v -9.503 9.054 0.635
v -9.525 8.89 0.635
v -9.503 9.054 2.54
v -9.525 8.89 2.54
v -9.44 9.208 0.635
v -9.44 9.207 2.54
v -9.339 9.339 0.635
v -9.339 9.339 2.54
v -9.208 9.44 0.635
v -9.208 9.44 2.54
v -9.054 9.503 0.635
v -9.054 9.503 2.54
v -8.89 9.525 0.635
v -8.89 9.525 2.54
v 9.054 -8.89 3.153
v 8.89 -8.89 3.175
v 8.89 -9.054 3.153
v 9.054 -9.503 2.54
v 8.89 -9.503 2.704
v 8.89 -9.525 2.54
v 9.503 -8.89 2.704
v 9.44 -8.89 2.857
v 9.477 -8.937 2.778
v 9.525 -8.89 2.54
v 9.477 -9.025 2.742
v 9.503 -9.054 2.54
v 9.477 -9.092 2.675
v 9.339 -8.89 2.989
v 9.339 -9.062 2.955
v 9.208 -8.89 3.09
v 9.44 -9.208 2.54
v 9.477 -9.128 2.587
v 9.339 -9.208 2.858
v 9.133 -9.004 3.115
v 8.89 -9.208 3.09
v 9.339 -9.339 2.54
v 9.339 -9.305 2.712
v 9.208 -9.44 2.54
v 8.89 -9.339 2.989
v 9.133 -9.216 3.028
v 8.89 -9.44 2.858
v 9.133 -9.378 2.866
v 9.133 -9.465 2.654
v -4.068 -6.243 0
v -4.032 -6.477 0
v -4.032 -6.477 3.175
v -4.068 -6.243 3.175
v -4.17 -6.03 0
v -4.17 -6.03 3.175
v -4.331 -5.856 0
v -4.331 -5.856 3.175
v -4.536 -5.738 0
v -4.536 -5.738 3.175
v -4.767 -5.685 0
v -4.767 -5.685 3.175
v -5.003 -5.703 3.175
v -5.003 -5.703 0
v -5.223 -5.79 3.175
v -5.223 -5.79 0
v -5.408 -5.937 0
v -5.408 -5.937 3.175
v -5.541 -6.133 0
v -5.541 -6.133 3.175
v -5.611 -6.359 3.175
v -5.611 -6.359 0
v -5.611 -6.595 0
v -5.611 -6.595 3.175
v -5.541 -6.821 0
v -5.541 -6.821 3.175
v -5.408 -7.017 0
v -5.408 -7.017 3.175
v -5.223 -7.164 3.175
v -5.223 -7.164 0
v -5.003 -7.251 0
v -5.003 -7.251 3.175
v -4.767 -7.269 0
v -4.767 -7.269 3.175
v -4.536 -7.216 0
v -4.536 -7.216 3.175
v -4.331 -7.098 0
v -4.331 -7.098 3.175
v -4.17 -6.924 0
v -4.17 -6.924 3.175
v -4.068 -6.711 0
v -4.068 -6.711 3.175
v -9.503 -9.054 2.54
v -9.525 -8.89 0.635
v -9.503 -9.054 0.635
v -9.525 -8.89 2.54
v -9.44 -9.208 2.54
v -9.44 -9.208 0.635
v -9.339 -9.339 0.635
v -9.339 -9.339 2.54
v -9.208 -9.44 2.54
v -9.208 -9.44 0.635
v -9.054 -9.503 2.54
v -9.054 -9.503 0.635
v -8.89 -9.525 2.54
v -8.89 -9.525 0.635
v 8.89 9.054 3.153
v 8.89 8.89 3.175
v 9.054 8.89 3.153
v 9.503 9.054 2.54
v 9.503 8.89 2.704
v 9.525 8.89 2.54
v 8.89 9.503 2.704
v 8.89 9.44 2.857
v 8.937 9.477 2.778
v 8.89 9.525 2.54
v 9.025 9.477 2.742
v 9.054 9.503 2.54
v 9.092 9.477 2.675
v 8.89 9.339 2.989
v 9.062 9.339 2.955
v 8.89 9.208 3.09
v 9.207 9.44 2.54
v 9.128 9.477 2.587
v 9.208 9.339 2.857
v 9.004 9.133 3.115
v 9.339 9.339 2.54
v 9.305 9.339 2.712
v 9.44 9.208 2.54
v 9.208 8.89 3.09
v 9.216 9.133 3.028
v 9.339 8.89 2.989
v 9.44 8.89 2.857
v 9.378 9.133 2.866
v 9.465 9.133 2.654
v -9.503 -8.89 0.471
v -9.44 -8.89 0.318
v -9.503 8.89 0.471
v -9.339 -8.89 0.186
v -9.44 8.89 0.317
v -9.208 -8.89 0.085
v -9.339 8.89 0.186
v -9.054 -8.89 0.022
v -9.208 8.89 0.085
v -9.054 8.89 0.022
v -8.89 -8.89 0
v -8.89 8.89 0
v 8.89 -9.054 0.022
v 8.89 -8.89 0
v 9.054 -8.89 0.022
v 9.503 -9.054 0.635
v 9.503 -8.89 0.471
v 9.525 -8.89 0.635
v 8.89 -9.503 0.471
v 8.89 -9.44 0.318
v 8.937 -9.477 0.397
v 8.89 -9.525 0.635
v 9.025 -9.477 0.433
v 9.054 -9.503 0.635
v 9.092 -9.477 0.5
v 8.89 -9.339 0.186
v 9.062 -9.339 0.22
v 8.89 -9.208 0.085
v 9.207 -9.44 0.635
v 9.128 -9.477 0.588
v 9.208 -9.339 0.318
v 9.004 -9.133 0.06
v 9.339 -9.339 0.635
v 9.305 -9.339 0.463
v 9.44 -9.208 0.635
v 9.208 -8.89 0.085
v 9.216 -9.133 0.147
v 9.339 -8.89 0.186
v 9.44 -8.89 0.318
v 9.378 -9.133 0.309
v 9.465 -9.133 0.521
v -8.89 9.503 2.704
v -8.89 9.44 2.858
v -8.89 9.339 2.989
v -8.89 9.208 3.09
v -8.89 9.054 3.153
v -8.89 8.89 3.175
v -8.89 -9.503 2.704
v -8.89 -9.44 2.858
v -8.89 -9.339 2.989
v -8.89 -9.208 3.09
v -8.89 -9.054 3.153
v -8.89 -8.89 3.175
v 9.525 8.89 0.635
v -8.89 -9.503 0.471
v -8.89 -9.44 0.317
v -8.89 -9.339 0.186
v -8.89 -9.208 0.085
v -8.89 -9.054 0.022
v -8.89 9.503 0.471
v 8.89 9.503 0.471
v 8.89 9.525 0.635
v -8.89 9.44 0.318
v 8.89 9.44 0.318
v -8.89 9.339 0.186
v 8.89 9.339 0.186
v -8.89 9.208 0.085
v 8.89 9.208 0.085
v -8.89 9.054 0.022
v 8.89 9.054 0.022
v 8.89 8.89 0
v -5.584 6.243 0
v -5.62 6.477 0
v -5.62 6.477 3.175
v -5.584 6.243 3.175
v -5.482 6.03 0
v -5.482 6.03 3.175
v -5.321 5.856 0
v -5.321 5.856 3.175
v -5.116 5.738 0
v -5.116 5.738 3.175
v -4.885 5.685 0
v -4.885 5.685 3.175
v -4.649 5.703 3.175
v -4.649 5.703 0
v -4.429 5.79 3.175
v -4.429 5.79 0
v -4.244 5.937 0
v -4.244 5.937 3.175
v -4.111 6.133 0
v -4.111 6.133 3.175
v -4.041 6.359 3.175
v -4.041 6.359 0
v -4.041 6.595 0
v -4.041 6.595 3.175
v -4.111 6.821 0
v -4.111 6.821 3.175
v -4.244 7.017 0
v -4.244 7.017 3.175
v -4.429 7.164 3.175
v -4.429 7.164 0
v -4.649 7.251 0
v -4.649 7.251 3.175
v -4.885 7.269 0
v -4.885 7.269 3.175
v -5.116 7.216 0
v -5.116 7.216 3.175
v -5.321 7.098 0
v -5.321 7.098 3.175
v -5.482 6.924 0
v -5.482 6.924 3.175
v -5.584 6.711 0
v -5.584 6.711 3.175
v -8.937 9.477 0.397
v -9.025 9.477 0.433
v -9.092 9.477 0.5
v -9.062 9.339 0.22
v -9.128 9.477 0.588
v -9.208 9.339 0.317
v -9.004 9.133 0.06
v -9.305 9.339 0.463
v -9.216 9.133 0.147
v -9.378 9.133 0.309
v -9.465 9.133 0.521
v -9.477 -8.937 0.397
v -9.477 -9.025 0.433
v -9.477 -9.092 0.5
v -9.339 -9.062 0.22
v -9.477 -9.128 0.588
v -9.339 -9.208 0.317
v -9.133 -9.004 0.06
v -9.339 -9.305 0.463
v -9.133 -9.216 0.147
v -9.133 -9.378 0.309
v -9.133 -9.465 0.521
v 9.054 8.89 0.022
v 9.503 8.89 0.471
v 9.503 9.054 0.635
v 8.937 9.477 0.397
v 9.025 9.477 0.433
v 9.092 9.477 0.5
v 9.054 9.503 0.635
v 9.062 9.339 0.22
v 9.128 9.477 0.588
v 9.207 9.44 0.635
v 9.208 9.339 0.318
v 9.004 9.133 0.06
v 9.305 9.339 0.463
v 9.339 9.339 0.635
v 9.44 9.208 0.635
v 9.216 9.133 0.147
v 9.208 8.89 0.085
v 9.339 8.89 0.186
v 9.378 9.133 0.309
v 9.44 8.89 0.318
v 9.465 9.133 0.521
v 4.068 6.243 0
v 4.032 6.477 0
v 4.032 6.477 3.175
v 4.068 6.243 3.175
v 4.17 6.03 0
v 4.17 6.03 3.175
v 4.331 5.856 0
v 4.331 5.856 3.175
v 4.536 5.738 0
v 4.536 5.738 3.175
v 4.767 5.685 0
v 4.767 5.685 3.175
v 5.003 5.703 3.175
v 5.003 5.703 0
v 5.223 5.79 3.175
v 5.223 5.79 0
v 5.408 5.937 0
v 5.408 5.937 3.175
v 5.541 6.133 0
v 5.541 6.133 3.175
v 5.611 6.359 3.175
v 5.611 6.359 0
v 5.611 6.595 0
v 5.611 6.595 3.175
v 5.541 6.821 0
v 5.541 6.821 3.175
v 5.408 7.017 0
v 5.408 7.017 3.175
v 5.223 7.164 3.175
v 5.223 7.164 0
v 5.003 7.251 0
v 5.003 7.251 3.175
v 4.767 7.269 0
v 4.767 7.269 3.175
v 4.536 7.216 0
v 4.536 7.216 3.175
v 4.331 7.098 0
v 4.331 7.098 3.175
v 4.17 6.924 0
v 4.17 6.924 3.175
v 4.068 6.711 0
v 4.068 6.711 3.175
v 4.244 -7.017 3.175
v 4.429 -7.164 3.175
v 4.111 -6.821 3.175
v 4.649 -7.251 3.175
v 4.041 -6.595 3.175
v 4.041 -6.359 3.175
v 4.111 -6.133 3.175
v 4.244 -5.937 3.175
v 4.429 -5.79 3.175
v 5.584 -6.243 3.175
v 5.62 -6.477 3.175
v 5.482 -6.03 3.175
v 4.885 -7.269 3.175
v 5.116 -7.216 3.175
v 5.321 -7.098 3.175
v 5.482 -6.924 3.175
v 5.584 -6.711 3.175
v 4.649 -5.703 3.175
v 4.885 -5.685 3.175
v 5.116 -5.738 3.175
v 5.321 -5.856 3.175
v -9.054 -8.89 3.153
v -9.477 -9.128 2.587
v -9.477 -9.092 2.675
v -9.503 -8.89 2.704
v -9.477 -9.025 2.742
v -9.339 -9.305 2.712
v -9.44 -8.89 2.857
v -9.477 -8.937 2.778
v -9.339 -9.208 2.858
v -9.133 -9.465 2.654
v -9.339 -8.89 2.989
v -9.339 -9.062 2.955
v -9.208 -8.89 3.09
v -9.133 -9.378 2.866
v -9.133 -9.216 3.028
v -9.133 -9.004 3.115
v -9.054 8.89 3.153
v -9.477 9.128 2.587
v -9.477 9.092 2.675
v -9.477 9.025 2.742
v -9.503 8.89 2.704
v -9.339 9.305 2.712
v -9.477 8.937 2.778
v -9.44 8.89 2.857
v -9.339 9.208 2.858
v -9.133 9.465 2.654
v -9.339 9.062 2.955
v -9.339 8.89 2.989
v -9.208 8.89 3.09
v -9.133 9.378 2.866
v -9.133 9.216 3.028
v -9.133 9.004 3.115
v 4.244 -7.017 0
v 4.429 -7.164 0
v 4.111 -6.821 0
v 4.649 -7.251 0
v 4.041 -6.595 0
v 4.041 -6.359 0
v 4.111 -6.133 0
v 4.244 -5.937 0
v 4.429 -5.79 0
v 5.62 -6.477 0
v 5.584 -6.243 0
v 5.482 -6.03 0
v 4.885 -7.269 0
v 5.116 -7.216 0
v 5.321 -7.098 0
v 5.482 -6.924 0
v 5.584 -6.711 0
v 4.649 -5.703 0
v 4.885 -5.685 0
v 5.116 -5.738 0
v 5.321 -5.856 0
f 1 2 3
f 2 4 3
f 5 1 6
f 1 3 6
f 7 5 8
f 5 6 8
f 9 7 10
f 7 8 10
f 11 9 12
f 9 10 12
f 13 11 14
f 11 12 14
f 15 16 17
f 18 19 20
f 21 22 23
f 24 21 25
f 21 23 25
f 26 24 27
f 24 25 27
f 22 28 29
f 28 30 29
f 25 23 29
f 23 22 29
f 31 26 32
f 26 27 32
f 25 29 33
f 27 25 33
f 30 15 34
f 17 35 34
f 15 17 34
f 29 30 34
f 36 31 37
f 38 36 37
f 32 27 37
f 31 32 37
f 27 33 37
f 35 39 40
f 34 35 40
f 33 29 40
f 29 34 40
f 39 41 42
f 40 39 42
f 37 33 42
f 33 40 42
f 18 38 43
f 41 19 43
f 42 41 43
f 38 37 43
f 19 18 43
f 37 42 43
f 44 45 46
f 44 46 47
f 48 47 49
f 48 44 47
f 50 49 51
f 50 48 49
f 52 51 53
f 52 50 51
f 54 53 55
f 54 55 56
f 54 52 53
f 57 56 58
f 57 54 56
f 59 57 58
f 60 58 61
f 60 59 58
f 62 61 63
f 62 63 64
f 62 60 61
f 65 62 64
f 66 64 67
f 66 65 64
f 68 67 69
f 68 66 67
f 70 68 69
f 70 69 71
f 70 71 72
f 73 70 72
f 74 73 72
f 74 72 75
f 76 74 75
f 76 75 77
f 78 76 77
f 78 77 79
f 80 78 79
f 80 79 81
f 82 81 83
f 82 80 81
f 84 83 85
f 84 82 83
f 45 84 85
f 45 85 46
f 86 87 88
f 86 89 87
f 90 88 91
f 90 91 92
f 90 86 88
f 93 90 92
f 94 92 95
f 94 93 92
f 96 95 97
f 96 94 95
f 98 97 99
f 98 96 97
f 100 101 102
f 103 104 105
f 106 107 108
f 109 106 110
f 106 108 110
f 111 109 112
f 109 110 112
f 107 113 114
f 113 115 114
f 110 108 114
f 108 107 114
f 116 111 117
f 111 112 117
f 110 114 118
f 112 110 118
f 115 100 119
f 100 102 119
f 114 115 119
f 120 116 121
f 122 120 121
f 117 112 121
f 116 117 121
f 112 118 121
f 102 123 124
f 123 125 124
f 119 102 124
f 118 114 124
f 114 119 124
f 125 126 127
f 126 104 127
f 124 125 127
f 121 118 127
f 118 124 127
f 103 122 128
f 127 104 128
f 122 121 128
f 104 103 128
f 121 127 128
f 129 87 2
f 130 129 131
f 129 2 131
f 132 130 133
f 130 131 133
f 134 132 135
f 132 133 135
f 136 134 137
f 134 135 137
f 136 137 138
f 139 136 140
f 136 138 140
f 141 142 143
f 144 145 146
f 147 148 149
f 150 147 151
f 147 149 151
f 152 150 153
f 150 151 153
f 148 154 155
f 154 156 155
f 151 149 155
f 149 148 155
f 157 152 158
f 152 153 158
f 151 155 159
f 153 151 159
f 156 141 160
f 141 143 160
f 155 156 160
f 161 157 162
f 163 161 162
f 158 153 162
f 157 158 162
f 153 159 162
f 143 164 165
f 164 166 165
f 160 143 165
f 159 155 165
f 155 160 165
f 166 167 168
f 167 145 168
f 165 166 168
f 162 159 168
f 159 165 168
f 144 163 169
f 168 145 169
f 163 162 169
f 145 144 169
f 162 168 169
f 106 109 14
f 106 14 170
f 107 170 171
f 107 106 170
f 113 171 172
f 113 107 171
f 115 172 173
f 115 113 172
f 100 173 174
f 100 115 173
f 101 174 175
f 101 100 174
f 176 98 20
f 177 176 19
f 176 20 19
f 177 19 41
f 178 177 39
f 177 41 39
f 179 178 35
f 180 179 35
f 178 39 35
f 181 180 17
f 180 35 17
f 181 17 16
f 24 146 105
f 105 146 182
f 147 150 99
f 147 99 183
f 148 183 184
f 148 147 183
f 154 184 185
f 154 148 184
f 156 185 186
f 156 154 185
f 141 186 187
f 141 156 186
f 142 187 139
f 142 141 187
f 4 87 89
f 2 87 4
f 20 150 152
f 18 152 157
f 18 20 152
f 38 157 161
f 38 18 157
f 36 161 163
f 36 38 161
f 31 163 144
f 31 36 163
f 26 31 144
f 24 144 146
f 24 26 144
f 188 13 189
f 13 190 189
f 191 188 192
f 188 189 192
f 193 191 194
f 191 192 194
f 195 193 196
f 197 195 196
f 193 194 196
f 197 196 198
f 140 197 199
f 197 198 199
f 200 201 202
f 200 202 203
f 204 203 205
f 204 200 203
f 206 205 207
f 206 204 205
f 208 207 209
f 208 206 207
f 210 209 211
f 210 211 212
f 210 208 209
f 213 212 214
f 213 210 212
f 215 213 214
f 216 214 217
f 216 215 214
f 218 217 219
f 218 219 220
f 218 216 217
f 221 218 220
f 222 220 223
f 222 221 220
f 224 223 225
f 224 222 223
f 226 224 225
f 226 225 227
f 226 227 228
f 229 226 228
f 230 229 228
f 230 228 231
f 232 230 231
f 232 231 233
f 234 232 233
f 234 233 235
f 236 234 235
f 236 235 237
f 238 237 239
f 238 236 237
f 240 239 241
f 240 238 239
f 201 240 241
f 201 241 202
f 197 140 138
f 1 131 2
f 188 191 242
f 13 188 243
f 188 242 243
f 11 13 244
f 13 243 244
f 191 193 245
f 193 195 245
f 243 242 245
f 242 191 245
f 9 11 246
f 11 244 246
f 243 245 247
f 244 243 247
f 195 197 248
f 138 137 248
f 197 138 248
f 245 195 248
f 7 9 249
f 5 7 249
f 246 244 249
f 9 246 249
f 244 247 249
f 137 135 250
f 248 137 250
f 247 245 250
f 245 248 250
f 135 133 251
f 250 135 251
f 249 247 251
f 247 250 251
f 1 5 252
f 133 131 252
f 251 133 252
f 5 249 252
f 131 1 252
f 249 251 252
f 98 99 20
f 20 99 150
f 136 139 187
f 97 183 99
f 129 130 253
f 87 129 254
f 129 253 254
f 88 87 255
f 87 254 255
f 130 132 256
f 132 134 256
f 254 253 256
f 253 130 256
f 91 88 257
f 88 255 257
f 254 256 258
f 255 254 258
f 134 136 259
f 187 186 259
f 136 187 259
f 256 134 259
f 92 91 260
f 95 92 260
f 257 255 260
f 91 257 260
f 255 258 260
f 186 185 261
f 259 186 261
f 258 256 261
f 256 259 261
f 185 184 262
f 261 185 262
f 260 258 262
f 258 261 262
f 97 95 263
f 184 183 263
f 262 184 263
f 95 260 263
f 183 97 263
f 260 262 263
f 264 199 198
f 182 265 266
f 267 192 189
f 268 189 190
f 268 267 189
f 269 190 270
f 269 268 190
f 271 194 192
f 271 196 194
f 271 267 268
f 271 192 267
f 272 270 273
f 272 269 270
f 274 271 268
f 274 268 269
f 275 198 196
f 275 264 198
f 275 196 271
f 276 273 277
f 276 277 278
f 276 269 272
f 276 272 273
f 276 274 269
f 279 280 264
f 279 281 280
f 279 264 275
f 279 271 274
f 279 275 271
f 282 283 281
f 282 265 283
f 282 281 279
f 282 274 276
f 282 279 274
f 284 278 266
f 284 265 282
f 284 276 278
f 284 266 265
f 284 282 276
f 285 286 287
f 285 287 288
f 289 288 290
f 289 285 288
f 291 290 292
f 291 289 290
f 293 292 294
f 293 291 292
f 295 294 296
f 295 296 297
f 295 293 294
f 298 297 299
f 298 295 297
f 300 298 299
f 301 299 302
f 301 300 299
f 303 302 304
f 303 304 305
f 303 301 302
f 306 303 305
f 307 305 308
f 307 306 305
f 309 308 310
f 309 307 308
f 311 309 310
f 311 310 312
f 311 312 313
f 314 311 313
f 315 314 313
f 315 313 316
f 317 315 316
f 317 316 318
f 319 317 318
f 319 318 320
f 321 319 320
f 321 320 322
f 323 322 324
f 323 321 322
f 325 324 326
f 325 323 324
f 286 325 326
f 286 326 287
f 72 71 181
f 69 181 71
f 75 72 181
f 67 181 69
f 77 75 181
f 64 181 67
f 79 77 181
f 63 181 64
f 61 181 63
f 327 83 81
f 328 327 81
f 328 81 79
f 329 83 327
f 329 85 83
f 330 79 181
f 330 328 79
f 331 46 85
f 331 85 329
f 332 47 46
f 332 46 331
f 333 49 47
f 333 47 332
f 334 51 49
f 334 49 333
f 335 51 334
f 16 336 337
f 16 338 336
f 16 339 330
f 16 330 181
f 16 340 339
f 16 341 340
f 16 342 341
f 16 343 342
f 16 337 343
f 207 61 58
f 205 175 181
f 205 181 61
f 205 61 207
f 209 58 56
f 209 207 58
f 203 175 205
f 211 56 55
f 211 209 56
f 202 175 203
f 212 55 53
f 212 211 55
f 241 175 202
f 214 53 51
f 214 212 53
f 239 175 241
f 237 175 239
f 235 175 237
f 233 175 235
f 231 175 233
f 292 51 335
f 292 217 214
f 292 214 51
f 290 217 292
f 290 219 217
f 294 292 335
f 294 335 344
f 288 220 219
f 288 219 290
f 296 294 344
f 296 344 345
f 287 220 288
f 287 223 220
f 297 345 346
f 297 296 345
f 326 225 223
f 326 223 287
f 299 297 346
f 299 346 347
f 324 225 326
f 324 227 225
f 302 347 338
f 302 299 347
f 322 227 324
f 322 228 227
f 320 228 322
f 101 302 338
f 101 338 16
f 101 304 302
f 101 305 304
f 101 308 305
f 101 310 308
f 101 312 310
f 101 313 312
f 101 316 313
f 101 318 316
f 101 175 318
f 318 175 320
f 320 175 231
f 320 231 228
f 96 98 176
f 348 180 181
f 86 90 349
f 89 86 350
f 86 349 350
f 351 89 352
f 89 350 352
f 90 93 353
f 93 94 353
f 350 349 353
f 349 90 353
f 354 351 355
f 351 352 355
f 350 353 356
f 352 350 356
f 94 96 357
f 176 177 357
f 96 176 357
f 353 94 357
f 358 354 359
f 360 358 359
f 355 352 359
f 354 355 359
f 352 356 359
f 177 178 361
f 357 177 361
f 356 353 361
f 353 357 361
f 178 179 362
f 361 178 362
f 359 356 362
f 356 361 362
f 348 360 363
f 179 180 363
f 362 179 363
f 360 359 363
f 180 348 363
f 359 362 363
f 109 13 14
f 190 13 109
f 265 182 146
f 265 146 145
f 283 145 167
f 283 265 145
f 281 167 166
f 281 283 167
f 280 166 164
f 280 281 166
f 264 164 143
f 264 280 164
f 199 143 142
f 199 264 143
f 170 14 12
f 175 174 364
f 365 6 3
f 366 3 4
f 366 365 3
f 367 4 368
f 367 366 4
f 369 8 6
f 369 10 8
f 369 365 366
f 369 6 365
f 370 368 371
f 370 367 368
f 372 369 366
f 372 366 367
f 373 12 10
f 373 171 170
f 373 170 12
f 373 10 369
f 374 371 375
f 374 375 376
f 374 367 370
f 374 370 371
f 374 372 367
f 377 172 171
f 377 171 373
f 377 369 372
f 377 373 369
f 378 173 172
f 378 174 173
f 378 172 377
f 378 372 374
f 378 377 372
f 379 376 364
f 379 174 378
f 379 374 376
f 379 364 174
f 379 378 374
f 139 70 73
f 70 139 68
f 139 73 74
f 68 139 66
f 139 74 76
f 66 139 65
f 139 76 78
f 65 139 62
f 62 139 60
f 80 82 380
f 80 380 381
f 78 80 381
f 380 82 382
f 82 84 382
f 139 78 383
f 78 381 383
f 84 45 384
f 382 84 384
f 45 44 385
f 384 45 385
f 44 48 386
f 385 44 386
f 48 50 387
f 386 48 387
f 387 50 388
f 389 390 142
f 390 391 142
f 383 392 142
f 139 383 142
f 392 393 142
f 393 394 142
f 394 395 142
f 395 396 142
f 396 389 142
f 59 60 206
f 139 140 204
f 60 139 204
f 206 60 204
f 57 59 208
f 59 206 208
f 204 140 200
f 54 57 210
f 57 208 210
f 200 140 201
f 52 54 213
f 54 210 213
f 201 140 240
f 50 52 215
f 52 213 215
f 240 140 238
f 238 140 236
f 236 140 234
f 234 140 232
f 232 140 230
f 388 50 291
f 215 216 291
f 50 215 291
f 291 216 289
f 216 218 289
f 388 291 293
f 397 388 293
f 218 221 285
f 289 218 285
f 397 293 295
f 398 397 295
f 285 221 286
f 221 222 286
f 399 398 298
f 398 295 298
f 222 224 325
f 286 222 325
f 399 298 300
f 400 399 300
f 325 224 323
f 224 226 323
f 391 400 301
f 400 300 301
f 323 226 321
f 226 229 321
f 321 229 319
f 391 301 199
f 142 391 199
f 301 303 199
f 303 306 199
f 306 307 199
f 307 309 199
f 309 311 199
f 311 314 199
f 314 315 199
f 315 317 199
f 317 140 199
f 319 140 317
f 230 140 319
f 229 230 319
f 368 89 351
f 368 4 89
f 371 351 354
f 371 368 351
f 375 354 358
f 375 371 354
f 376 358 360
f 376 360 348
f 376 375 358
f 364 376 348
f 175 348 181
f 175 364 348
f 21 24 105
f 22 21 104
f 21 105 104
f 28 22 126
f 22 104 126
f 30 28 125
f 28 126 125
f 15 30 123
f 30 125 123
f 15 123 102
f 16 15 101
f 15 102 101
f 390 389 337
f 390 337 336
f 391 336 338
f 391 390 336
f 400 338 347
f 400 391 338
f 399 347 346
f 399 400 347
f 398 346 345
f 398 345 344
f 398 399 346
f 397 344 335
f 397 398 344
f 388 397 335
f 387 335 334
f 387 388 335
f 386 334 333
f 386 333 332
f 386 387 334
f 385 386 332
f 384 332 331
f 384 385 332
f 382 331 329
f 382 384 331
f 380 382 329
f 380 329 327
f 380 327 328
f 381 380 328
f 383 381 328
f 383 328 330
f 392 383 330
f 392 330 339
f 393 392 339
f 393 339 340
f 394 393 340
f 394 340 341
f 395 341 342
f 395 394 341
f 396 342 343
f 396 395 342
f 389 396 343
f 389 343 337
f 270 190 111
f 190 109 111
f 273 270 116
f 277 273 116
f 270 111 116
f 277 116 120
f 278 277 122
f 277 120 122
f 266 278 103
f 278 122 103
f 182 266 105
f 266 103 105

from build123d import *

# Parameters (mm, degrees)
SKETCH1_W           = 19.05
SKETCH1_H           = 19.05
SKETCH1_R           = 0.79375
BOSS_EXTRUDE1_DEPTH = 3.175
FILLET2_R           = 0.635


with BuildPart() as part:
    # Sketch1 → Boss-Extrude1 (new body)
    with BuildSketch(Plane.XY):
        Rectangle(SKETCH1_W, SKETCH1_H)
        with Locations((-4.826, -6.477)):
            Circle(SKETCH1_R, mode=Mode.SUBTRACT)
        with Locations((4.826, -6.477)):
            Circle(SKETCH1_R, mode=Mode.SUBTRACT)
        with Locations(Location((4.826, 6.477, 0), (0, 0, 180))):
            Circle(SKETCH1_R, mode=Mode.SUBTRACT)
        with Locations(Location((-4.826, 6.477, 0), (0, 0, 180))):
            Circle(SKETCH1_R, mode=Mode.SUBTRACT)
    extrude(amount=BOSS_EXTRUDE1_DEPTH)

    # Fillet2
    fillet2_edges = [part.edges().sort_by_distance(p)[0] for p in [
        (0, -9.525, 3.175),
        (9.525, 0, 3.175),
        (0, 9.525, 3.175),
        (9.525, 0, 0),
        (0, -9.525, 0),
        (-9.525, 0, 0),
        (0, 9.525, 0),
        (9.525, 9.525, 1.5875),
        (9.525, -9.525, 1.5875),
        (-9.525, -9.525, 1.5875),
        (-9.525, 9.525, 1.5875),
        (-9.525, 0, 3.175),
    ]]
    fillet(fillet2_edges, radius=FILLET2_R)


solid = part.part
